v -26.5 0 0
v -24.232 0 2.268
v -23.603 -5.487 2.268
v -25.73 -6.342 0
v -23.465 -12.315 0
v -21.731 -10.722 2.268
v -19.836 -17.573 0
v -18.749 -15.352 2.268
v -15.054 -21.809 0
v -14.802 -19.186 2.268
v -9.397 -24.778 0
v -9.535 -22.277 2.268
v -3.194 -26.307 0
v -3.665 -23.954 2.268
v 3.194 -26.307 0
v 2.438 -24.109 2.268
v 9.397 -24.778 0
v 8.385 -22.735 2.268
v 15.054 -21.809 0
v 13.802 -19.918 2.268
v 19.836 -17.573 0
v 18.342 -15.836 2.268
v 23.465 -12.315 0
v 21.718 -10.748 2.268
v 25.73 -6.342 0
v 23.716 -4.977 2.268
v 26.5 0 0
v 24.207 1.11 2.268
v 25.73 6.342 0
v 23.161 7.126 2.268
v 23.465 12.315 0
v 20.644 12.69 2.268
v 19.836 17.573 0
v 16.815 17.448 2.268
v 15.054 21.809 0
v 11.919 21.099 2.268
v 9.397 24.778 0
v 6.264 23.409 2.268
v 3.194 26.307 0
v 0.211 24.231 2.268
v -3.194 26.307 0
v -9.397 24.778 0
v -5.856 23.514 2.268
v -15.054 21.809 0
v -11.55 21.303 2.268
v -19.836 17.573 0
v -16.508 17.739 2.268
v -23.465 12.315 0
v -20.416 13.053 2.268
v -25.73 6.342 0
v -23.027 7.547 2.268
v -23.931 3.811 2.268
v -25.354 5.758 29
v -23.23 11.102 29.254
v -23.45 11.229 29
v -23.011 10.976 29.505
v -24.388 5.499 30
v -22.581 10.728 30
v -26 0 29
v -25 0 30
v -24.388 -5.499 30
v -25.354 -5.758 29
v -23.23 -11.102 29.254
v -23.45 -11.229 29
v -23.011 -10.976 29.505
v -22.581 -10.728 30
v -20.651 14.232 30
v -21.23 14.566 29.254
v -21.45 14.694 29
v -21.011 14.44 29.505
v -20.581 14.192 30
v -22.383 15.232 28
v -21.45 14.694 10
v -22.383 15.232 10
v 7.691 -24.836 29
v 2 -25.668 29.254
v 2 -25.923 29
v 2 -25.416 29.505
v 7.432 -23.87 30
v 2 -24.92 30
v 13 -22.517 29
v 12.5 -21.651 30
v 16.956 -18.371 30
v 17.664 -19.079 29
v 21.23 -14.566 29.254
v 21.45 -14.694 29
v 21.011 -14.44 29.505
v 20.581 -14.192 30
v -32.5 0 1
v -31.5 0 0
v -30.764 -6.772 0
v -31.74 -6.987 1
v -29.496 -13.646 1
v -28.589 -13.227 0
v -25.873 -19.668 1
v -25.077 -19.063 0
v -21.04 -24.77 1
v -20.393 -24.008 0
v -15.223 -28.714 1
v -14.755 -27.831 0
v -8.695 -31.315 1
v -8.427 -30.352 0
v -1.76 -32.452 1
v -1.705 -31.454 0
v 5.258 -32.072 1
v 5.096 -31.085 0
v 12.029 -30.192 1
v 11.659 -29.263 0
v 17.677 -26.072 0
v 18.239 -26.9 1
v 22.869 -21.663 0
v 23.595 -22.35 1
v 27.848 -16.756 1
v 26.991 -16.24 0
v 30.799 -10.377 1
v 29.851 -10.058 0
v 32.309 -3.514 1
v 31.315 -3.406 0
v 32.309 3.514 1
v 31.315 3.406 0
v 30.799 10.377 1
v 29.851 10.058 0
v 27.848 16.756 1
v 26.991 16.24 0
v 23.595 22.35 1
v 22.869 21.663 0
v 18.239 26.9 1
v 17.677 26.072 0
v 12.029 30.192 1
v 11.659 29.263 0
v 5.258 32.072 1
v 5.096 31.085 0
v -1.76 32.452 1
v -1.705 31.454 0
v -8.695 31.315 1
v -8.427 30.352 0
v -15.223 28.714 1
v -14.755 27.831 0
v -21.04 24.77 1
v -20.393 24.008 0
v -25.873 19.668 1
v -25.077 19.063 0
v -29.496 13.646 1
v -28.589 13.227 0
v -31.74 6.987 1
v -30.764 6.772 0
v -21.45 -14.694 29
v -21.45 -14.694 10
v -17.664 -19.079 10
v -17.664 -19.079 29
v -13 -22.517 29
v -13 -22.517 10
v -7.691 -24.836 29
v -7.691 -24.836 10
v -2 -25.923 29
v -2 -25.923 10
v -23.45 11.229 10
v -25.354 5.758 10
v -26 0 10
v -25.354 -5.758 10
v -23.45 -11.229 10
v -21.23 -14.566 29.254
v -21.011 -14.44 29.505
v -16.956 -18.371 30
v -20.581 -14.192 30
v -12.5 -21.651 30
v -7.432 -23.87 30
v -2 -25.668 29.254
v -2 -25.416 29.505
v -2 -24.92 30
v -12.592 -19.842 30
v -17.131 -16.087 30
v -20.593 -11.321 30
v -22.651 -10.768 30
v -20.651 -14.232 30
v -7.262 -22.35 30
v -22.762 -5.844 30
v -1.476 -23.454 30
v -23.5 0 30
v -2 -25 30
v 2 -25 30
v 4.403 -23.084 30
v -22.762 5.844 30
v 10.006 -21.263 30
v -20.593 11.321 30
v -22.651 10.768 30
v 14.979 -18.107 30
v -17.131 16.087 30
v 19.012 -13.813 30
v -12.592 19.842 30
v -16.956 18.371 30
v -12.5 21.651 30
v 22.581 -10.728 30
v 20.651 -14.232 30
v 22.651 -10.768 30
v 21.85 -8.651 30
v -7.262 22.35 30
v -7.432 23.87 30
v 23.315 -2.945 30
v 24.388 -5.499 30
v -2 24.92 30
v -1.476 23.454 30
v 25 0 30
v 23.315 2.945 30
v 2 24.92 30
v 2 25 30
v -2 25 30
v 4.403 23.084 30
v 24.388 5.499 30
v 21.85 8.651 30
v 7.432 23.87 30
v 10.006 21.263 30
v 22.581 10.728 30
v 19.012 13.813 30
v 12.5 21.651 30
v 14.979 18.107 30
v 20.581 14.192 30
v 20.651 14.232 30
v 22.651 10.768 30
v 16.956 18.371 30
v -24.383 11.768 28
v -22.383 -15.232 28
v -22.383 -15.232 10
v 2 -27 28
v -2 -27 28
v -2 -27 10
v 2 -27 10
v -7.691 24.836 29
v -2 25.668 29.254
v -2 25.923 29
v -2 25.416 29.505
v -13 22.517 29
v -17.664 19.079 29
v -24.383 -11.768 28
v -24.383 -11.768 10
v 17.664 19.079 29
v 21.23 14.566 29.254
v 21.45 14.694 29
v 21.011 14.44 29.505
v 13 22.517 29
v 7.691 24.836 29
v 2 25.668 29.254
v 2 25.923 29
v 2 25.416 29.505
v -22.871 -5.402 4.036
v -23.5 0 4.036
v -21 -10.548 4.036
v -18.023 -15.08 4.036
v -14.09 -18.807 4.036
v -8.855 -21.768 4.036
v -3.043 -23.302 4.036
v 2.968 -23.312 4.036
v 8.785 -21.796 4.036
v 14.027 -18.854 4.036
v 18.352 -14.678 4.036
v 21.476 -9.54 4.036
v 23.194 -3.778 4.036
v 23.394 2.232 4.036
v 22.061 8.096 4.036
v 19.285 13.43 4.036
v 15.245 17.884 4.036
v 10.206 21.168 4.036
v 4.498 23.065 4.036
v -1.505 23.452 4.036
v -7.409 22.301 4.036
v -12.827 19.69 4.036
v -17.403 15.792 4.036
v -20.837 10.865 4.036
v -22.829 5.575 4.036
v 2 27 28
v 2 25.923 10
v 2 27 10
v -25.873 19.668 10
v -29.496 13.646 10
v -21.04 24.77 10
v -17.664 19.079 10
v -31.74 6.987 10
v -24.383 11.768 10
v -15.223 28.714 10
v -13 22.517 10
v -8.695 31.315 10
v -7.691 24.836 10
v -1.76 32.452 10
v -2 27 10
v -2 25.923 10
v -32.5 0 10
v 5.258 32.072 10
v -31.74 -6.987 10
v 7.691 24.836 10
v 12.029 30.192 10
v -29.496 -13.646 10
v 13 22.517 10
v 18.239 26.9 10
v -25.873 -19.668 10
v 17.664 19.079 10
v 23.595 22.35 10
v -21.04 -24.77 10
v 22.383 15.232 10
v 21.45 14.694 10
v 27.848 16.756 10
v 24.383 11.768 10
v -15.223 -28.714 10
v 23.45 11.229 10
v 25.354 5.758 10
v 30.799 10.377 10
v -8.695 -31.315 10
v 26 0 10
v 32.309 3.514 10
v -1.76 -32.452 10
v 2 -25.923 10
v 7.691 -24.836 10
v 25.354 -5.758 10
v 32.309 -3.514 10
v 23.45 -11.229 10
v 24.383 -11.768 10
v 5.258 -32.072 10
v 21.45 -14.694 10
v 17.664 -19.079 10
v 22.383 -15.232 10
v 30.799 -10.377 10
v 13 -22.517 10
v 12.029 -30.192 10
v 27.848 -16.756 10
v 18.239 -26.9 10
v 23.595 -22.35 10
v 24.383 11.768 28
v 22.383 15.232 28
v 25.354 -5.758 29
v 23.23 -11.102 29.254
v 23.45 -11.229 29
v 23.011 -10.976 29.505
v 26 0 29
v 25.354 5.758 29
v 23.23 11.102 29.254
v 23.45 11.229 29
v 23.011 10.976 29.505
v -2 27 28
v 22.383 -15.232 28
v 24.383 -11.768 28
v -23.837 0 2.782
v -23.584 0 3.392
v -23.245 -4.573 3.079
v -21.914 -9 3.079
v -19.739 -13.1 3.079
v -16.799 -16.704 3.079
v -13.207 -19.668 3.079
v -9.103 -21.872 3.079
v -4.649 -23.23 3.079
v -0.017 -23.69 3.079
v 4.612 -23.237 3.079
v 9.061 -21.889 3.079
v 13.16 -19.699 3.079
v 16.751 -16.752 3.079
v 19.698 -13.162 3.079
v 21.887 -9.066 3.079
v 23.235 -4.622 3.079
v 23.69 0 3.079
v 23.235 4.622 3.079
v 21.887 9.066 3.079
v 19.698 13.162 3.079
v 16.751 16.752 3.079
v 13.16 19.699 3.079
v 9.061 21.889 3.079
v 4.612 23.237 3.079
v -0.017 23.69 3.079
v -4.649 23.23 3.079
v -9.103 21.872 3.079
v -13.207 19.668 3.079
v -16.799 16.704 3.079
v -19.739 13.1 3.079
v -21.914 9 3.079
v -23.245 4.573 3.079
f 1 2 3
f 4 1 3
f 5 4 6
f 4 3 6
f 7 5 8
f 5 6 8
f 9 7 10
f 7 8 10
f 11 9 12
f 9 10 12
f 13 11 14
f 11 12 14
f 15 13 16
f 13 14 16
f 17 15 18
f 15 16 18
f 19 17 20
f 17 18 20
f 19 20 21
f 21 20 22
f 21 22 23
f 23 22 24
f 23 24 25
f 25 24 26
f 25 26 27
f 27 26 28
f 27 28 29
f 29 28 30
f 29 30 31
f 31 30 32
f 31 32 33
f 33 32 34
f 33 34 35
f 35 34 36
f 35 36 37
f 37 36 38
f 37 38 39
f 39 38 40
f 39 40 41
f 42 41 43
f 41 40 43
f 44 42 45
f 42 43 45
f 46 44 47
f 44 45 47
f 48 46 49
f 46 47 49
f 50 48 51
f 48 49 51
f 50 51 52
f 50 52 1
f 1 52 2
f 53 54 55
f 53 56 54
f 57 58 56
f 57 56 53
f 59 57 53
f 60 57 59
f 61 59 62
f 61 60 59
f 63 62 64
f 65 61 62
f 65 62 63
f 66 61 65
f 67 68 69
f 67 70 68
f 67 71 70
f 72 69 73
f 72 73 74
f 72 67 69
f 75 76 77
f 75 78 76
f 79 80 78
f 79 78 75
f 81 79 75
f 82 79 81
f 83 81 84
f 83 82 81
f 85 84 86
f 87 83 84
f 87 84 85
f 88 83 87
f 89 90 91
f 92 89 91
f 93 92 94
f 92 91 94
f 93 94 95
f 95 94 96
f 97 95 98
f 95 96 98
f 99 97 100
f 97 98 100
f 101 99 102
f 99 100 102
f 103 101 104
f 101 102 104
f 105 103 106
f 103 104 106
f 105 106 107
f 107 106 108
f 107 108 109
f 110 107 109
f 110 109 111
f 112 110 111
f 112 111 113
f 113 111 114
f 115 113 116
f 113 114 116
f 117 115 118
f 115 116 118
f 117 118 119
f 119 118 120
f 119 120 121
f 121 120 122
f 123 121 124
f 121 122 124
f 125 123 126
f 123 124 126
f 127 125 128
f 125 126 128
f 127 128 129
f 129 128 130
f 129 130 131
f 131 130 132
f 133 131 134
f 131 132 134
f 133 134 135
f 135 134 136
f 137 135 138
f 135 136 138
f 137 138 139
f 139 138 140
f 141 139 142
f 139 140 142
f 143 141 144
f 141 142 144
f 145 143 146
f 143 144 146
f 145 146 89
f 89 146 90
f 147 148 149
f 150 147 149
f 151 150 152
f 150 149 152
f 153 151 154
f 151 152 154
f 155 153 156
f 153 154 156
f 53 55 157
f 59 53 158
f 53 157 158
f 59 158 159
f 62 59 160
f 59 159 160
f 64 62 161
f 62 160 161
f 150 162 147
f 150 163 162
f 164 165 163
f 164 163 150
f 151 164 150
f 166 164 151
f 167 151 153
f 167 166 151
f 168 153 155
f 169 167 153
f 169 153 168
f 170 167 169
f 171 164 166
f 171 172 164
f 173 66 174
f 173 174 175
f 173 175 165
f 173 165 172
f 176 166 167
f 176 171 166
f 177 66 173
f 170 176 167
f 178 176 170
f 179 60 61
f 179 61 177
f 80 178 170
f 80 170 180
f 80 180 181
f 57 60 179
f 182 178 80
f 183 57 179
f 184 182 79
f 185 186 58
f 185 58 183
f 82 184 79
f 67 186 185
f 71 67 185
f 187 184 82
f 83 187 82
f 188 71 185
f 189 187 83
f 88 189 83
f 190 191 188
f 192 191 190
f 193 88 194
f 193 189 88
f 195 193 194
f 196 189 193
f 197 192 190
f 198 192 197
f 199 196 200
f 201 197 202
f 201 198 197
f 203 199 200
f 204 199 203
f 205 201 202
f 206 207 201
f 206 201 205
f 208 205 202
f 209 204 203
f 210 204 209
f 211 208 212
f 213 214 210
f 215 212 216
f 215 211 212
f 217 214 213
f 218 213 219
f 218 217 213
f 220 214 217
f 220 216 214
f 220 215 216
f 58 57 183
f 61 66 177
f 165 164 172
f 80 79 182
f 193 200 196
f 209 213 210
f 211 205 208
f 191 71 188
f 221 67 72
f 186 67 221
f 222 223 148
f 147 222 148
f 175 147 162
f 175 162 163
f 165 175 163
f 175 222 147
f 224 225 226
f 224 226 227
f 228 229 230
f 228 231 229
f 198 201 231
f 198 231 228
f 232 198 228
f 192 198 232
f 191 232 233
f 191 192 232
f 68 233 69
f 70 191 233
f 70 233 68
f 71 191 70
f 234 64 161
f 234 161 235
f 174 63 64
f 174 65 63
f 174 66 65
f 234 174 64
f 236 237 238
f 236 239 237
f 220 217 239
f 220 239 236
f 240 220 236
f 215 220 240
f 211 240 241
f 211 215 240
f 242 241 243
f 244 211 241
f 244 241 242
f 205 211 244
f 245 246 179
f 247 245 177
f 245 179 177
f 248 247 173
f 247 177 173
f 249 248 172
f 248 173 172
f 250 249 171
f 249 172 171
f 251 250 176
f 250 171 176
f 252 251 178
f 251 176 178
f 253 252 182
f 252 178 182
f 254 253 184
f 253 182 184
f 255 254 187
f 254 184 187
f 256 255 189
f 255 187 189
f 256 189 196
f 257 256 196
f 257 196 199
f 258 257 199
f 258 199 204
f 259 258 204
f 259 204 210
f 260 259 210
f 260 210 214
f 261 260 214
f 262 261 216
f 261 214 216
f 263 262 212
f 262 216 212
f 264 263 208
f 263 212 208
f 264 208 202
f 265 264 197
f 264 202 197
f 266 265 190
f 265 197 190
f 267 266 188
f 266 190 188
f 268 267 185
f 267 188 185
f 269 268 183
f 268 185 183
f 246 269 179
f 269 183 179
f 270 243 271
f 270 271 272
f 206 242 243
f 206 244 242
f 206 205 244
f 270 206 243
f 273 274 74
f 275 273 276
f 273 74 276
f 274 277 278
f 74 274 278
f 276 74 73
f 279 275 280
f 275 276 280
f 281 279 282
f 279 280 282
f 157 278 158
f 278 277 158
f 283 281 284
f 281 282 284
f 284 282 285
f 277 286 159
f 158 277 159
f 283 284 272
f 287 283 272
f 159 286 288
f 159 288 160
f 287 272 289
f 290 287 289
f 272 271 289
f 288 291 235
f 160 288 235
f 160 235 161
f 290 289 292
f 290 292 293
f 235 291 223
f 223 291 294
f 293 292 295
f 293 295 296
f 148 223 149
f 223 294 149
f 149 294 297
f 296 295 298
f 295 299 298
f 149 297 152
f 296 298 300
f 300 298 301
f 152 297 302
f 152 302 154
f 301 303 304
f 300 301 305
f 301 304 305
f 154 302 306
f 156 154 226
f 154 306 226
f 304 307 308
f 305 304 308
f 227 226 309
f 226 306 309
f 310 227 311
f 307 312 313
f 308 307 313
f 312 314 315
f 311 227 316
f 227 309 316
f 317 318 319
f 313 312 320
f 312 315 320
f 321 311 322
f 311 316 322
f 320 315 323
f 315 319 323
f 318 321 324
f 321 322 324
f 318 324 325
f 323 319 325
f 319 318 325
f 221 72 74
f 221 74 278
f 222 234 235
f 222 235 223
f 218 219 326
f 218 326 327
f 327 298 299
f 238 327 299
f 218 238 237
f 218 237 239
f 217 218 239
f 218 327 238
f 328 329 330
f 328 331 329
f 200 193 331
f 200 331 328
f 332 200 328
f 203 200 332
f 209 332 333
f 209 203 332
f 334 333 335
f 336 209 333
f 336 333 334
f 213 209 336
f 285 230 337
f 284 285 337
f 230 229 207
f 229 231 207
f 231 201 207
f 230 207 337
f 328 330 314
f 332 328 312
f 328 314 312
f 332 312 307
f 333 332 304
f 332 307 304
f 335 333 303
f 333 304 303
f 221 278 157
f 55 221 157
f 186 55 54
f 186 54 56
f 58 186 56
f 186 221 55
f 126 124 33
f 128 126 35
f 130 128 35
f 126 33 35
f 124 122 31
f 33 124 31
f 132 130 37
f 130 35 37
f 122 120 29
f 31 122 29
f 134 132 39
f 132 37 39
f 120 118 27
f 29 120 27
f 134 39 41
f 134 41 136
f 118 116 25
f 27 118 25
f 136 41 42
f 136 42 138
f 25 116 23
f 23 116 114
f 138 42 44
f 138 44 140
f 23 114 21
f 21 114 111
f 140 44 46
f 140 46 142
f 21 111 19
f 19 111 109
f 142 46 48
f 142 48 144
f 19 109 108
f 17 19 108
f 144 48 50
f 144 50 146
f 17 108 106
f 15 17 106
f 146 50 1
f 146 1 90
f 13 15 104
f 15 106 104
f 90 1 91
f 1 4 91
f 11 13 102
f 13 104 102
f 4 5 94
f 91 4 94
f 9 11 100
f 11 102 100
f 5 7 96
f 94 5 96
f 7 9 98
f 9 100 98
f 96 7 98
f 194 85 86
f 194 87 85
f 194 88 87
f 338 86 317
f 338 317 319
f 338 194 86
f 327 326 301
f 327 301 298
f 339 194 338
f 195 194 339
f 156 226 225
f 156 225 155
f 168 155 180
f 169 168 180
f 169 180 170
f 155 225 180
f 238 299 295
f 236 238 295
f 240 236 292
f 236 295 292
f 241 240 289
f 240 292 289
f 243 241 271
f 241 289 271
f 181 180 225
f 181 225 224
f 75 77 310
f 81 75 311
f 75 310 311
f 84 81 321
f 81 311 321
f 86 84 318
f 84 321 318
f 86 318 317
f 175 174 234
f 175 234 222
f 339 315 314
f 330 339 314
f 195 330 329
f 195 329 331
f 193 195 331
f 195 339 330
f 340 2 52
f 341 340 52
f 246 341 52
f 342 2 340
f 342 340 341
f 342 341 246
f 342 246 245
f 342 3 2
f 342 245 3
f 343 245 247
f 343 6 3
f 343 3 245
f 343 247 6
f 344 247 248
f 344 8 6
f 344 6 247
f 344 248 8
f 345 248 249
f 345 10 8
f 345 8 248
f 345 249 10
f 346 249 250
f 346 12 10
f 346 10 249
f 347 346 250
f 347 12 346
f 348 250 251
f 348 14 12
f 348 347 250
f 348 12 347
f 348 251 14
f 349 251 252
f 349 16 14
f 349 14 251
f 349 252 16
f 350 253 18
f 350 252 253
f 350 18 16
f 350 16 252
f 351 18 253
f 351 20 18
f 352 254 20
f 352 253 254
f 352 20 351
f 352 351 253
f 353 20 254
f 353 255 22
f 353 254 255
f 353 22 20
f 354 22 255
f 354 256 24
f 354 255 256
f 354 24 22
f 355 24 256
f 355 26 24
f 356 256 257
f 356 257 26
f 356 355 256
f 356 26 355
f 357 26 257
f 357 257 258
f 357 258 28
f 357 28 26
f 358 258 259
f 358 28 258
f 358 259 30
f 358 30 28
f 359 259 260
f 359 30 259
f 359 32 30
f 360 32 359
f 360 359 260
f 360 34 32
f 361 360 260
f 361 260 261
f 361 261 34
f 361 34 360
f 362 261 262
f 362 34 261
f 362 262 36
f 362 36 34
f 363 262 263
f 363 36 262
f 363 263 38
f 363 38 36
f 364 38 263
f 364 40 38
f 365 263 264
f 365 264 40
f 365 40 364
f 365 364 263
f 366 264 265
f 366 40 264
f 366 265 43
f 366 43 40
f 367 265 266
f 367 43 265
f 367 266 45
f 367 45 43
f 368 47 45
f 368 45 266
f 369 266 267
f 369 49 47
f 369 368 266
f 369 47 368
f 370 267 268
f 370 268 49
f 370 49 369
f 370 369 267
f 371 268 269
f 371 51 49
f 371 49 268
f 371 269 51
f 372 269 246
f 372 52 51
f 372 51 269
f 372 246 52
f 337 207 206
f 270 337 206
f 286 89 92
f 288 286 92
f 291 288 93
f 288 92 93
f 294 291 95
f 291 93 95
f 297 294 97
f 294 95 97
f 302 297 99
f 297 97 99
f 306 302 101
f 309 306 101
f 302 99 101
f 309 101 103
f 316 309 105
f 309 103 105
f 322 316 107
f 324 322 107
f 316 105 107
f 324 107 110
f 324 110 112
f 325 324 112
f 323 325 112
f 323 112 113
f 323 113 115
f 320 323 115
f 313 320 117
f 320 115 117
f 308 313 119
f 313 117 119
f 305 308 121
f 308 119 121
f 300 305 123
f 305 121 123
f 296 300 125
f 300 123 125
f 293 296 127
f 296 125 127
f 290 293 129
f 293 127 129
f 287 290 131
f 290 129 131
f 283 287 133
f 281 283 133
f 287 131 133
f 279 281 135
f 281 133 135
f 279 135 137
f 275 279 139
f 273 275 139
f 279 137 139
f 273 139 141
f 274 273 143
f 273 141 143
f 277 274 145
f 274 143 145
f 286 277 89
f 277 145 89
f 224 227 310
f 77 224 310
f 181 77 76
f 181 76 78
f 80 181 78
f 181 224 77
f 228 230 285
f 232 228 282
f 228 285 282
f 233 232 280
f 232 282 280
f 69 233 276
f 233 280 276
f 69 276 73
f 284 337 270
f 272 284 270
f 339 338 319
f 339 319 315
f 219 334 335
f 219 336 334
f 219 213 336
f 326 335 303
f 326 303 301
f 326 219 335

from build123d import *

# Parameters (mm, degrees)
F2_SIZE  = 3
F3_R     = 2.5
F4_W     = 4
F4_H     = 1.5
F5_DEPTH = 20
F6_SIZE  = 1
F7_SIZE  = 2
F8_SIZE  = 1


with BuildPart() as f1:
    # F0 (on Front) → F1 (revolve)
    with BuildSketch(Plane.XZ):
        Polygon((-32.5, 0), (-23.5, 0), (-23.5, 30), (-26, 30), (-26, 10), (-32.5, 10), align=None)
    revolve(axis=Axis((0, 0, 27.1835356757), (0, 0, 1)))

    # F2
    f2_edges = [f1.edges().sort_by_distance(p)[0] for p in [
        (23.5, 0, 0),
    ]]
    chamfer(f2_edges, length=F2_SIZE)

    # F3
    f3_edges = [f1.edges().sort_by_distance(p)[0] for p in [
        (23.5, 0, 3),
    ]]
    fillet(f3_edges, radius=F3_R)

    # F4 (on face) → F5 (join, through all)
    with BuildSketch(Plane.XY.offset(30)):
        with Locations((0, -26.25)):
            Rectangle(F4_W, F4_H)
        Polygon((22.3826859022, -15.2320508076), (24.3826859022, -11.7679491924), (23.0836477965, -11.0179491924), (21.0836477965, -14.4820508076), align=None)
        Polygon((24.3826859022, 11.7679491924), (22.3826859022, 15.2320508076), (21.0836477965, 14.4820508076), (23.0836477965, 11.0179491924), align=None)
        with Locations((0, 26.25)):
            Rectangle(F4_W, F4_H)
        Polygon((-22.3826859022, 15.2320508076), (-24.3826859022, 11.7679491924), (-23.0836477965, 11.0179491924), (-21.0836477965, 14.4820508076), align=None)
        Polygon((-24.3826859022, -11.7679491924), (-22.3826859022, -15.2320508076), (-21.0836477965, -14.4820508076), (-23.0836477965, -11.0179491924), align=None)
    extrude(amount=-F5_DEPTH)

    # F6
    f6_edges = [f1.edges().sort_by_distance(p)[0] for p in [
        (-26, 0, 30),
        (-13, 22.51666, 30),
        (13, 22.51666, 30),
        (26, 0, 30),
        (13, -22.51666, 30),
        (-13, -22.51666, 30),
    ]]
    chamfer(f6_edges, length=F6_SIZE)

    # F7
    f7_edges = [f1.edges().sort_by_distance(p)[0] for p in [
        (23.382686, -13.5, 30),
        (23.382686, 13.5, 30),
        (0, 27, 30),
        (-23.382686, 13.5, 30),
        (-23.382686, -13.5, 30),
        (0, -27, 30),
    ]]
    chamfer(f7_edges, length=F7_SIZE)

    # F8
    f8_edges = [f1.edges().sort_by_distance(p)[0] for p in [
        (32.5, 0, 0),
    ]]
    chamfer(f8_edges, length=F8_SIZE)


solid = f1.part
